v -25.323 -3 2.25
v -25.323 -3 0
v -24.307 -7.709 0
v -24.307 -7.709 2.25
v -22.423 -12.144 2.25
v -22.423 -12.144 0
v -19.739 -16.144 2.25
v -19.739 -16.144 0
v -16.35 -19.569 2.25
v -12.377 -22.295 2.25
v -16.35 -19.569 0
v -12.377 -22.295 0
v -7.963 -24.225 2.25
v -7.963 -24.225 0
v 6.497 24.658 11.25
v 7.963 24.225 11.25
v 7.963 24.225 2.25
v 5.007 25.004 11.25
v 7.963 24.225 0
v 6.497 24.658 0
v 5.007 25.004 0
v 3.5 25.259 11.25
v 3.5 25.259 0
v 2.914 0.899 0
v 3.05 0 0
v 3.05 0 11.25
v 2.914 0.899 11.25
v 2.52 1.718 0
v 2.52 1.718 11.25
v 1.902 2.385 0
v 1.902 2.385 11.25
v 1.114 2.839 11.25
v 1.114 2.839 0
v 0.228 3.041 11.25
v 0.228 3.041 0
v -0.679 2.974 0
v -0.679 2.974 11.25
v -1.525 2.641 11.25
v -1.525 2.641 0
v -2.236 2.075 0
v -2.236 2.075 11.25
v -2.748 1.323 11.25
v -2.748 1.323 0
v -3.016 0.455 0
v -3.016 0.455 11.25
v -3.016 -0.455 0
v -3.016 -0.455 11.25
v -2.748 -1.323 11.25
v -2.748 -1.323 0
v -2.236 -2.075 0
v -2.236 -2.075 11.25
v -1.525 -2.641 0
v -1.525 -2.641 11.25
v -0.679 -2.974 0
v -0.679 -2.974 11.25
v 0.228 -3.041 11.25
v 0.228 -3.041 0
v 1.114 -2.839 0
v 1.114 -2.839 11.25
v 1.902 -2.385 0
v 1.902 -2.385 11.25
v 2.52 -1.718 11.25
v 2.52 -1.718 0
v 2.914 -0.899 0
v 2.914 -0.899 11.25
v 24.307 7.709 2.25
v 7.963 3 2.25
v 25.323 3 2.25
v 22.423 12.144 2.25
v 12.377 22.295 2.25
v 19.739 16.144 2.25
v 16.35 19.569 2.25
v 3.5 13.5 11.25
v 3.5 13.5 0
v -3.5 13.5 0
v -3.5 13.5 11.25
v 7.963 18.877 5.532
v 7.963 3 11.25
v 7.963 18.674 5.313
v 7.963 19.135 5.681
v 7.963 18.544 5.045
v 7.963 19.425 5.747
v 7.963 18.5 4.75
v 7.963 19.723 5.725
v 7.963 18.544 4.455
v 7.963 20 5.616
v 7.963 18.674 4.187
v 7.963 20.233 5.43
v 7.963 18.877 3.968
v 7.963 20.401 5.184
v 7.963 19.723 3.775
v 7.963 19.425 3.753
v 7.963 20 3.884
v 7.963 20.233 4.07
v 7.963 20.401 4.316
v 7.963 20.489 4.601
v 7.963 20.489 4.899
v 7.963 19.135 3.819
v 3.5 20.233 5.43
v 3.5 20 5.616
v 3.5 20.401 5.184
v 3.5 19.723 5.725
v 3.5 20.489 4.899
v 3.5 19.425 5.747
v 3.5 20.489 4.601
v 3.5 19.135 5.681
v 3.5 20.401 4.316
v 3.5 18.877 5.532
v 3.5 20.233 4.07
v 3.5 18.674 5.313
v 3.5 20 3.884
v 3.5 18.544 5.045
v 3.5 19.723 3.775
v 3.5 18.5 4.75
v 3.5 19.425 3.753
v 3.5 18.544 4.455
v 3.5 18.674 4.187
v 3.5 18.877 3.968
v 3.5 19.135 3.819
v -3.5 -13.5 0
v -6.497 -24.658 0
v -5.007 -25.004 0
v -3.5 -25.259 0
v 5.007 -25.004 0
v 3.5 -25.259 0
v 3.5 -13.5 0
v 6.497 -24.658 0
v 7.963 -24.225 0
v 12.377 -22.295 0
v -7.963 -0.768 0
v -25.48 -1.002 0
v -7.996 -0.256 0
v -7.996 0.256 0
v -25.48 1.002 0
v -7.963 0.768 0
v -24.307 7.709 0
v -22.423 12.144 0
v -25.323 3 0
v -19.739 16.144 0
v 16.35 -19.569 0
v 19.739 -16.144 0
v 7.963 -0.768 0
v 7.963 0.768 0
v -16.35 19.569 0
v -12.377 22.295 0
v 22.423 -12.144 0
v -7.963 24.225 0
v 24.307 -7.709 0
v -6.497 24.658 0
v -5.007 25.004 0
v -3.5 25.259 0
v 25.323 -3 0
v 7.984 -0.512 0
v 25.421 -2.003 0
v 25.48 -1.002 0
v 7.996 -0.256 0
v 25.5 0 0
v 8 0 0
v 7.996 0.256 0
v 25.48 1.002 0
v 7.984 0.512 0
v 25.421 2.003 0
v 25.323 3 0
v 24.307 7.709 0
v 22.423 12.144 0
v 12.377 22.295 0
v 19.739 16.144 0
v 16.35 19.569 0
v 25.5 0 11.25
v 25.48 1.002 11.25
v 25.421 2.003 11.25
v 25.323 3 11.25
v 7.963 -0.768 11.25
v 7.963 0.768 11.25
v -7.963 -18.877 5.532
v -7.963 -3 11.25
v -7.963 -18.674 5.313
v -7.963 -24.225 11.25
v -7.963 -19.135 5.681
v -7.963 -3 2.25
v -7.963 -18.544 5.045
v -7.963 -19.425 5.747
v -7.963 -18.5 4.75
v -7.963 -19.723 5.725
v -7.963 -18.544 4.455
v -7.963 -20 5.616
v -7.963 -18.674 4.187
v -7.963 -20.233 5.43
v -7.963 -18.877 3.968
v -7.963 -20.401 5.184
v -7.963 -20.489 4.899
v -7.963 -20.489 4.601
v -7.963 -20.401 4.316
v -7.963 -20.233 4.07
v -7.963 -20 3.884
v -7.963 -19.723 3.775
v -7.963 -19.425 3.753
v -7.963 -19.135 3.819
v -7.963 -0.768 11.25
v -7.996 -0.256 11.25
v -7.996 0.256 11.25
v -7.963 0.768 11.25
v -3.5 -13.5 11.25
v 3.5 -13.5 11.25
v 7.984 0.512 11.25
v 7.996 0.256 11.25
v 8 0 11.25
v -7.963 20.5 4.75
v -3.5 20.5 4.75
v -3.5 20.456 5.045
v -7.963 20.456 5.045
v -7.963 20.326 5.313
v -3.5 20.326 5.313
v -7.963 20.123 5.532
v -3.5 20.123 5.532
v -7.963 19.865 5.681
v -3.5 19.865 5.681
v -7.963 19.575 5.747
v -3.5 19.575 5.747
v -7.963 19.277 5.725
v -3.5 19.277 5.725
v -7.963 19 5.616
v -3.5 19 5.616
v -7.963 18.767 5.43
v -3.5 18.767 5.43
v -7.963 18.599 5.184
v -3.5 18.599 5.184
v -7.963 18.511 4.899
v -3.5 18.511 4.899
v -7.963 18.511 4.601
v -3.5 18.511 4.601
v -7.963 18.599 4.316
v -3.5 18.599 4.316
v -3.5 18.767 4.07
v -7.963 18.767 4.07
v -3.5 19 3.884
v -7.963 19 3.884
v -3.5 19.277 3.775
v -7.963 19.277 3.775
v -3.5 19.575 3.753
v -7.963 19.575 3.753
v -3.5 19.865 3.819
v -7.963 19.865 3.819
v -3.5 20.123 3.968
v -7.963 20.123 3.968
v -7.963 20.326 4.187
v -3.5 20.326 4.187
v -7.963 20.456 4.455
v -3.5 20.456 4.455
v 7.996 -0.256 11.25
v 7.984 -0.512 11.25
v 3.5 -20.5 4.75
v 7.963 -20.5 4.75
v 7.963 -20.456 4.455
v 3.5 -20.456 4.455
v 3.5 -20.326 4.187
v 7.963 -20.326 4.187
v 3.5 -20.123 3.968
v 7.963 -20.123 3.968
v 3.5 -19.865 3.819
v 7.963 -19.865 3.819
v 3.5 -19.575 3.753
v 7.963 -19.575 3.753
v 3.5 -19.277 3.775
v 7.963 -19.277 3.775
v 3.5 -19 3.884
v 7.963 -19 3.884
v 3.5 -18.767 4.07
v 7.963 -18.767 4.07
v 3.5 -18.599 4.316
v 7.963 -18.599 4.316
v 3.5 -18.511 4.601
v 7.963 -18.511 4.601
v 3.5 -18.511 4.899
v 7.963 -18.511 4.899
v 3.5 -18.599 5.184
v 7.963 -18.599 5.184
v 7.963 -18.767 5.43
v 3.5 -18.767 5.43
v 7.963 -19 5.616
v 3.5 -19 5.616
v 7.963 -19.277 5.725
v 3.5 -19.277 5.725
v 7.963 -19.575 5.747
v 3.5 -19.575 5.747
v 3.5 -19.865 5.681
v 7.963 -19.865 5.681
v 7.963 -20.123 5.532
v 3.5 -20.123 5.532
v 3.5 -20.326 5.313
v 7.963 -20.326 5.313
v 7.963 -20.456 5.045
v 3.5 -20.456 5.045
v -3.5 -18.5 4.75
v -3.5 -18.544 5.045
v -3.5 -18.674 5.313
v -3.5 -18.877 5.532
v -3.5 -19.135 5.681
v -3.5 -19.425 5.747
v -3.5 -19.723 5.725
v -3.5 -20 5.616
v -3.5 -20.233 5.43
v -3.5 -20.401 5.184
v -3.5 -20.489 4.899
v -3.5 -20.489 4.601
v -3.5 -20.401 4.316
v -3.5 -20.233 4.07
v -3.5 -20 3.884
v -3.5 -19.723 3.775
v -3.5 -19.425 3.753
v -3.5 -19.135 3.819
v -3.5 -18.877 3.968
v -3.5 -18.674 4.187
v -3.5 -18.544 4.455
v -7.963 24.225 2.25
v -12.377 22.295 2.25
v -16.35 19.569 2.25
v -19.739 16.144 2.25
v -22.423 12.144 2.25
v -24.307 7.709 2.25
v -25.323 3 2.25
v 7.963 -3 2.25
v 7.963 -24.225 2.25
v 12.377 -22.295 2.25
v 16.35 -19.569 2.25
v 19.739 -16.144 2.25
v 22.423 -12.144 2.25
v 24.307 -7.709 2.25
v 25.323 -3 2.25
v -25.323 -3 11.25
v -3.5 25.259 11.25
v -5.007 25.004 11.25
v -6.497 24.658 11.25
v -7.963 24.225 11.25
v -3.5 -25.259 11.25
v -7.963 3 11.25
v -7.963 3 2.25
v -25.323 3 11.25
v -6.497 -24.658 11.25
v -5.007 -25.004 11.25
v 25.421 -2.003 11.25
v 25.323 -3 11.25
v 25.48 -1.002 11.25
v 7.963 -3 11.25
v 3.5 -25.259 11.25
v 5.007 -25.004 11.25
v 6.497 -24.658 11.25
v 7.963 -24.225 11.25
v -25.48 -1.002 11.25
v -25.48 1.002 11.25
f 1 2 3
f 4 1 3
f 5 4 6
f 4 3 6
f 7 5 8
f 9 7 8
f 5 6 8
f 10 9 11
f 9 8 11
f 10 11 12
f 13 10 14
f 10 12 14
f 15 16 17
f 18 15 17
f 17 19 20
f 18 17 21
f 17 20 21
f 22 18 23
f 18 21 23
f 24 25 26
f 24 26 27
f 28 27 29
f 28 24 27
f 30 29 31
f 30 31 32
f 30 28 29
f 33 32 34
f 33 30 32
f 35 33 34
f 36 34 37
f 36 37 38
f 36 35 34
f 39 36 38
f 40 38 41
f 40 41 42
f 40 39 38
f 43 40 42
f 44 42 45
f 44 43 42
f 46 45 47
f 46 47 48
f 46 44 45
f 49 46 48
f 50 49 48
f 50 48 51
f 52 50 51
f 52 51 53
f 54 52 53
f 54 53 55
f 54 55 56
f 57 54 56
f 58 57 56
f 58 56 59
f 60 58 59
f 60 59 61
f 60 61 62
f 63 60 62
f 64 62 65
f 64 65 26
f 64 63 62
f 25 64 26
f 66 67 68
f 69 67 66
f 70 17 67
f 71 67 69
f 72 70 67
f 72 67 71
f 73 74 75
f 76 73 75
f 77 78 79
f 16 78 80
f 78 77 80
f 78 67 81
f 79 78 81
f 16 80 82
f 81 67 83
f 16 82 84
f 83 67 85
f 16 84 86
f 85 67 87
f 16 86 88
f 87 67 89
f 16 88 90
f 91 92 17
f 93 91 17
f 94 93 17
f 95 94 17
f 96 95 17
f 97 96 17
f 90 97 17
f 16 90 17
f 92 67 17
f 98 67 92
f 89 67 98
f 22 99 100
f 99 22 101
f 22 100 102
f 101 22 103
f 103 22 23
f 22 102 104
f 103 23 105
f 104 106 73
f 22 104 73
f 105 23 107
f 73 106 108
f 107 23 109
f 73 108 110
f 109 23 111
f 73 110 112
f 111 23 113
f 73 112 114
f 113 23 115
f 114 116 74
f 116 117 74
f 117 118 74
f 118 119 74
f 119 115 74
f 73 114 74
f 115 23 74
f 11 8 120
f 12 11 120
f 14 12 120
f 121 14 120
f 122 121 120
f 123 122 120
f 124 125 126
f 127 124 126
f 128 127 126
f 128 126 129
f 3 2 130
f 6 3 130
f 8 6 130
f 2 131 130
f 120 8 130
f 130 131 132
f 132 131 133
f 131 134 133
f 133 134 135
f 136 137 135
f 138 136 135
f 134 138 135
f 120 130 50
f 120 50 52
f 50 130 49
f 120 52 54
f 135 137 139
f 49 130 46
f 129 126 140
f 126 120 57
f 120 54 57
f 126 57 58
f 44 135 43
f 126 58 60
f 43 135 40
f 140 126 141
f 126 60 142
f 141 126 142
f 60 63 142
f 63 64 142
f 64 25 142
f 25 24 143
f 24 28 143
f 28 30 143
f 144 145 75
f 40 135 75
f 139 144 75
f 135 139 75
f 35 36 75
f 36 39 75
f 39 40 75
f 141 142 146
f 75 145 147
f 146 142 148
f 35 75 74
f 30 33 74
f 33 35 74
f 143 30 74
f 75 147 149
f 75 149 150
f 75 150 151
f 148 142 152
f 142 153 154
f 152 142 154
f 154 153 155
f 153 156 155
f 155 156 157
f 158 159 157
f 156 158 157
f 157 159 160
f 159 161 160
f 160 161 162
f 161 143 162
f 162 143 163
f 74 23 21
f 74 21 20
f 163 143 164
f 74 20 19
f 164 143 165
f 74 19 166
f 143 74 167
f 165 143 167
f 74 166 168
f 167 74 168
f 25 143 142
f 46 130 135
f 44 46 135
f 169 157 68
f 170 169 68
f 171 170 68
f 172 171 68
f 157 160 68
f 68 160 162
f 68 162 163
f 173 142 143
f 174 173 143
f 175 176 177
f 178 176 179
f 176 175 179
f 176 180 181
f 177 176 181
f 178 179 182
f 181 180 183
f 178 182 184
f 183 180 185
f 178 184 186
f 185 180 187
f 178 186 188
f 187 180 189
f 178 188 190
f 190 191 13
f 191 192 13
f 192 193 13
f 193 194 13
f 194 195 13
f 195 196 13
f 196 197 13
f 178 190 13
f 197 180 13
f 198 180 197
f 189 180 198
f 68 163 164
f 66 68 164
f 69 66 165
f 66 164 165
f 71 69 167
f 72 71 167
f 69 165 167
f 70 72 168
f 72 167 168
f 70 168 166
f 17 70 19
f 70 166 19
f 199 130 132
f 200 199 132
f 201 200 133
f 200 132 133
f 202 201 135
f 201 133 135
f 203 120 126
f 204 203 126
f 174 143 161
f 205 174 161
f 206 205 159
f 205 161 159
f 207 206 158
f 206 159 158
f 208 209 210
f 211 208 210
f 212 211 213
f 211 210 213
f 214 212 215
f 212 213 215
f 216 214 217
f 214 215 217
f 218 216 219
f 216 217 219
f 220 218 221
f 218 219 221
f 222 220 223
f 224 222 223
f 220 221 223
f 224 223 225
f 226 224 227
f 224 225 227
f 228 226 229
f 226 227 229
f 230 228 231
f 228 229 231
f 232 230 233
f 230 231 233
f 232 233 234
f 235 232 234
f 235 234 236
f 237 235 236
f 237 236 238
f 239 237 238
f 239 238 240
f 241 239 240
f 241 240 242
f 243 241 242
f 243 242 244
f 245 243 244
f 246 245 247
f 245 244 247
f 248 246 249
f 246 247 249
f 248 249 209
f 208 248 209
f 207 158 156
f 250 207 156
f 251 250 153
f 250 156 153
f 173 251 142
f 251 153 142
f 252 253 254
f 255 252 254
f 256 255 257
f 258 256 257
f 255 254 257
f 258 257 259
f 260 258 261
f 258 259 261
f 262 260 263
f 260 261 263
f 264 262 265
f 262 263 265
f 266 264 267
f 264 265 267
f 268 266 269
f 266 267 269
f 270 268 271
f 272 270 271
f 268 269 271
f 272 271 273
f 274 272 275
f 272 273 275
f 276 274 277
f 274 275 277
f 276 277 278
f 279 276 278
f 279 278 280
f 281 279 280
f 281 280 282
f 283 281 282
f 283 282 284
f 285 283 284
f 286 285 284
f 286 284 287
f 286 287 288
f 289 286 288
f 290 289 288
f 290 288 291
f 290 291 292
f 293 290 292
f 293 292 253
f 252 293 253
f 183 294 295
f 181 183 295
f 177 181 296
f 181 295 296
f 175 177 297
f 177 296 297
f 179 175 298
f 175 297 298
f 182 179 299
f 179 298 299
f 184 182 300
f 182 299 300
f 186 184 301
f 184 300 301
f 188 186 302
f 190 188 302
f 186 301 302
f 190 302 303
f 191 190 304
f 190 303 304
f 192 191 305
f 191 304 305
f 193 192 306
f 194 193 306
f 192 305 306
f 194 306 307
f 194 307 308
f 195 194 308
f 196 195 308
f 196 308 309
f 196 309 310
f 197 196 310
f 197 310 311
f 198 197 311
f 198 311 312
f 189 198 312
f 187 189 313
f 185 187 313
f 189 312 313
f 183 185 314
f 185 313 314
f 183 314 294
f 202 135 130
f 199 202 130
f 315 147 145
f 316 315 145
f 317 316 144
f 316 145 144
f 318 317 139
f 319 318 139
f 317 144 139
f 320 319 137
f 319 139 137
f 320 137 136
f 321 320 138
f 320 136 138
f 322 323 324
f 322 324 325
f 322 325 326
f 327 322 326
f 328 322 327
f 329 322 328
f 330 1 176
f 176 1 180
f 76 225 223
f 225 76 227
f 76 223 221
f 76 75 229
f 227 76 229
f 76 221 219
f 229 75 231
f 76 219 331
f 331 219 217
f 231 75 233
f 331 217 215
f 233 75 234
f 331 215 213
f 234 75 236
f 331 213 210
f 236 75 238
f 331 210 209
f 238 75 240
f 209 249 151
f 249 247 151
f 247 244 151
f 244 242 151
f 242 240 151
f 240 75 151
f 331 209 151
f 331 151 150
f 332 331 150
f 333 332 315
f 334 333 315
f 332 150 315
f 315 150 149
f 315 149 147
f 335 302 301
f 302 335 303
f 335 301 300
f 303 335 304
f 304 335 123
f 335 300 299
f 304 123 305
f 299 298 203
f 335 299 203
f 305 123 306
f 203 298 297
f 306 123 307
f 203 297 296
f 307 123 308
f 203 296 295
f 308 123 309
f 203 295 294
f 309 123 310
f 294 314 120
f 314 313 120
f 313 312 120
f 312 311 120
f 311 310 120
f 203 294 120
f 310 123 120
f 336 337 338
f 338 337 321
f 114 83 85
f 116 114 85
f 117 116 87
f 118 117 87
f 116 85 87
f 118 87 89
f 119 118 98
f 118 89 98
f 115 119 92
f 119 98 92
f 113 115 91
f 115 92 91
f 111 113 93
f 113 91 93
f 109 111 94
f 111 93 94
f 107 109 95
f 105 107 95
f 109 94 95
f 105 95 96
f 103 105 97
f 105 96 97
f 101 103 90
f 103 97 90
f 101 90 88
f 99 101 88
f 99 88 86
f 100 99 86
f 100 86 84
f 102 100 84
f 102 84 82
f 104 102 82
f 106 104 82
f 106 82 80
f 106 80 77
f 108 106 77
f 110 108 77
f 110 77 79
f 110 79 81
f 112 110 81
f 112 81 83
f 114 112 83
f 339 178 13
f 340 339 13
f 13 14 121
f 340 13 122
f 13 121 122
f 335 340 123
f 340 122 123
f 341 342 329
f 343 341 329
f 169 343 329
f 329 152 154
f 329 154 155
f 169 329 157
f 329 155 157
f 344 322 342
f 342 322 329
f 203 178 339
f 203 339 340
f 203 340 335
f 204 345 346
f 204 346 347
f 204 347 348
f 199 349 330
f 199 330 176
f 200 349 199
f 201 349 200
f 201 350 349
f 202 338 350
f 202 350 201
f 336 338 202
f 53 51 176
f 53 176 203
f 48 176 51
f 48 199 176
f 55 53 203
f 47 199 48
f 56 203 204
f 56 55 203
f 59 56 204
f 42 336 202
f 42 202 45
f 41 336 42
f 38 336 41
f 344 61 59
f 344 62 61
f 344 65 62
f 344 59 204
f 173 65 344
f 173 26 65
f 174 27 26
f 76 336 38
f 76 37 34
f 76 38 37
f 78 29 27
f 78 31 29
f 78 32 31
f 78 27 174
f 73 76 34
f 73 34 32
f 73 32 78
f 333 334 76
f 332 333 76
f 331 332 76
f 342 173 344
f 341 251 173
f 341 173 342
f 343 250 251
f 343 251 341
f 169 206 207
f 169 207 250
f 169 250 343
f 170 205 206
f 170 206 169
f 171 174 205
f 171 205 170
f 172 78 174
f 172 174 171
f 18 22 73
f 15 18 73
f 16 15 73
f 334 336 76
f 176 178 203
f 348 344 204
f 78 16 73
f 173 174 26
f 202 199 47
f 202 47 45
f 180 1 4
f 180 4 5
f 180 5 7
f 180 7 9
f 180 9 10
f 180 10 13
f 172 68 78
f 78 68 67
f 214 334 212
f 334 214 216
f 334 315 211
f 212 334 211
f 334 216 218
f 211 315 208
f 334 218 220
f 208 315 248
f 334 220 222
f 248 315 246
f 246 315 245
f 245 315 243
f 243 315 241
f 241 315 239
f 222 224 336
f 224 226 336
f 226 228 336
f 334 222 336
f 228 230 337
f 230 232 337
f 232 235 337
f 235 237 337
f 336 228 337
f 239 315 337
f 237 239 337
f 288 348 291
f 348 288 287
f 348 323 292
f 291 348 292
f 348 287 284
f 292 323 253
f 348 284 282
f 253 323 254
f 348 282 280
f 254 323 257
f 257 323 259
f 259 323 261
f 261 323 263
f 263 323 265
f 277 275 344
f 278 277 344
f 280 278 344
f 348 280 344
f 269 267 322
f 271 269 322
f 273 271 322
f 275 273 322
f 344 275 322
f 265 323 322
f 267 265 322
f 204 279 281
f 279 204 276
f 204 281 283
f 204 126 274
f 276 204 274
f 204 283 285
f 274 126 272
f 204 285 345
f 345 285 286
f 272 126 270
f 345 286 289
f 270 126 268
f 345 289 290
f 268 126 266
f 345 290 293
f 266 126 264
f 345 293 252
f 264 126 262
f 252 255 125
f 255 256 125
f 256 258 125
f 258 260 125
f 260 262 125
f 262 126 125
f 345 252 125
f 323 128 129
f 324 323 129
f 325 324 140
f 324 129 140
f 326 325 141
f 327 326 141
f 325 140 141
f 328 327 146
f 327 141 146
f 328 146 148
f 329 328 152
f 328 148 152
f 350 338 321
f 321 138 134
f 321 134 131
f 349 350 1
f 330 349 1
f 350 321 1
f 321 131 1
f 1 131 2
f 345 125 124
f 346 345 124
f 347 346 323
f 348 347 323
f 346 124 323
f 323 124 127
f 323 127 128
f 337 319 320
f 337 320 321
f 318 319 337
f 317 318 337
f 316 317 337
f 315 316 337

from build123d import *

# Parameters (mm, degrees)
F0_R     = 3.05
F1_DEPTH = 11.25
F2_DEPTH = 2.25
F4_D     = 2
F4_DEPTH = 25.501
F5_D     = 2


with BuildPart() as f1:
    # F0 (on Top) → F1 (new body)
    with BuildSketch(Plane.XY):
        with BuildLine():
            Line((7.9630808905, -0.7676866104), (7.9630808905, 0.7676866104))
            ThreePointArc((7.9630808905, 0.7676866104), (6.5707016234, 4.5635381204), (3.5, 7.193747285))
            Line((3.5, 7.193747285), (3.5, -7.193747285))
            ThreePointArc((3.5, -7.193747285), (6.5707016234, -4.5635381204), (7.9630808905, -0.7676866104))
        make_face()
        with BuildLine():
            Line((3.5, -7.193747285), (3.5, 7.193747285))
            ThreePointArc((3.5, 7.193747285), (0, 8), (-3.5, 7.193747285))
            Line((-3.5, 7.193747285), (-3.5, -7.193747285))
            ThreePointArc((-3.5, -7.193747285), (0, -8), (3.5, -7.193747285))
        make_face()
        Circle(F0_R, mode=Mode.SUBTRACT)
        with BuildLine():
            Line((-3.5, -7.193747285), (-3.5, 7.193747285))
            ThreePointArc((-3.5, 7.193747285), (-6.5707016234, 4.5635381204), (-7.9630808905, 0.7676866104))
            Line((-7.9630808905, 0.7676866104), (-7.9630808905, -0.7676866104))
            ThreePointArc((-7.9630808905, -0.7676866104), (-6.5707016234, -4.5635381204), (-3.5, -7.193747285))
        make_face()
        with BuildLine():
            Line((-3.5, 13.5), (-3.5, 25.2586618806))
            ThreePointArc((-3.5, 25.2586618806), (-5.7548058579, 24.842145832), (-7.9630808905, 24.2247671347))
            Line((-7.9630808905, 24.2247671347), (-7.9630808905, 13.5))
            Line((-7.9630808905, 13.5), (-3.5, 13.5))
        make_face()
        with BuildLine():
            Line((7.9630808905, 13.5), (7.9630808905, 24.2247671347))
            ThreePointArc((7.9630808905, 24.2247671347), (5.7548058579, 24.842145832), (3.5, 25.2586618806))
            Line((3.5, 25.2586618806), (3.5, 13.5))
            Line((3.5, 13.5), (7.9630808905, 13.5))
        make_face()
        with BuildLine():
            ThreePointArc((3.5, -25.2586618806), (5.7548058579, -24.842145832), (7.9630808905, -24.2247671347))
            Line((7.9630808905, -24.2247671347), (7.9630808905, -13.5))
            Line((7.9630808905, -13.5), (3.5, -13.5))
            Line((3.5, -13.5), (3.5, -25.2586618806))
        make_face()
        with BuildLine():
            ThreePointArc((-7.9630808905, -24.2247671347), (-5.7548058579, -24.842145832), (-3.5, -25.2586618806))
            Line((-3.5, -25.2586618806), (-3.5, -13.5))
            Line((-3.5, -13.5), (-7.9630808905, -13.5))
            Line((-7.9630808905, -13.5), (-7.9630808905, -24.2247671347))
        make_face()
        with BuildLine():
            Line((-3.5, 7.193747285), (-3.5, 13.5))
            Line((-3.5, 13.5), (-7.9630808905, 13.5))
            Line((-7.9630808905, 13.5), (-7.9630808905, 3))
            Line((-7.9630808905, 3), (-7.9630808905, 0.7676866104))
            ThreePointArc((-7.9630808905, 0.7676866104), (-6.5707016234, 4.5635381204), (-3.5, 7.193747285))
        make_face()
        with BuildLine():
            Line((7.9630808905, 0.7676866104), (7.9630808905, 3))
            Line((7.9630808905, 3), (7.9630808905, 13.5))
            Line((7.9630808905, 13.5), (3.5, 13.5))
            Line((3.5, 13.5), (3.5, 7.193747285))
            ThreePointArc((3.5, 7.193747285), (6.5707016234, 4.5635381204), (7.9630808905, 0.7676866104))
        make_face()
        with BuildLine():
            Line((7.9630808905, -13.5), (7.9630808905, -3))
            Line((7.9630808905, -3), (7.9630808905, -0.7676866104))
            ThreePointArc((7.9630808905, -0.7676866104), (6.5707016234, -4.5635381204), (3.5, -7.193747285))
            Line((3.5, -7.193747285), (3.5, -13.5))
            Line((3.5, -13.5), (7.9630808905, -13.5))
        make_face()
        with BuildLine():
            Line((-7.9630808905, -13.5), (-3.5, -13.5))
            Line((-3.5, -13.5), (-3.5, -7.193747285))
            ThreePointArc((-3.5, -7.193747285), (-6.5707016234, -4.5635381204), (-7.9630808905, -0.7676866104))
            Line((-7.9630808905, -0.7676866104), (-7.9630808905, -3))
            Line((-7.9630808905, -3), (-7.9630808905, -13.5))
        make_face()
        with BuildLine():
            Line((-7.9630808905, 3), (-25.3229145242, 3))
            ThreePointArc((-25.3229145242, 3), (-25.5, 0), (-25.3229145242, -3))
            Line((-25.3229145242, -3), (-7.9630808905, -3))
            Line((-7.9630808905, -3), (-7.9630808905, -0.7676866104))
            ThreePointArc((-7.9630808905, -0.7676866104), (-8, 0), (-7.9630808905, 0.7676866104))
            Line((-7.9630808905, 0.7676866104), (-7.9630808905, 3))
        make_face()
        with BuildLine():
            ThreePointArc((25.3229145242, -3), (25.4556901337, -1.5026109997), (25.5, 0))
            ThreePointArc((25.5, 0), (25.4556901337, 1.5026109997), (25.3229145242, 3))
            Line((25.3229145242, 3), (7.9630808905, 3))
            Line((7.9630808905, 3), (7.9630808905, 0.7676866104))
            ThreePointArc((7.9630808905, 0.7676866104), (7.9907648922, 0.3842869216), (8, 0))
            ThreePointArc((8, 0), (7.9907648922, -0.3842869216), (7.9630808905, -0.7676866104))
            Line((7.9630808905, -0.7676866104), (7.9630808905, -3))
            Line((7.9630808905, -3), (25.3229145242, -3))
        make_face()
        with BuildLine():
            Line((-3.5, -13.5), (3.5, -13.5))
            Line((3.5, -13.5), (3.5, -7.193747285))
            ThreePointArc((3.5, -7.193747285), (0, -8), (-3.5, -7.193747285))
            Line((-3.5, -7.193747285), (-3.5, -13.5))
        make_face()
        with BuildLine():
            Line((3.5, 7.193747285), (3.5, 13.5))
            Line((3.5, 13.5), (-3.5, 13.5))
            Line((-3.5, 13.5), (-3.5, 7.193747285))
            ThreePointArc((-3.5, 7.193747285), (0, 8), (3.5, 7.193747285))
        make_face()
    extrude(amount=F1_DEPTH)

    # F0 (on Top) → F2 (join)
    with BuildSketch(Plane.XY):
        with BuildLine():
            ThreePointArc((-25.3229145242, -3), (-19.7385931025, -16.1442851292), (-7.9630808905, -24.2247671347))
            Line((-7.9630808905, -24.2247671347), (-7.9630808905, -13.5))
            Line((-7.9630808905, -13.5), (-7.9630808905, -3))
            Line((-7.9630808905, -3), (-25.3229145242, -3))
        make_face()
        with BuildLine():
            Line((-3.5, -13.5), (3.5, -13.5))
            Line((3.5, -13.5), (3.5, -7.193747285))
            ThreePointArc((3.5, -7.193747285), (0, -8), (-3.5, -7.193747285))
            Line((-3.5, -7.193747285), (-3.5, -13.5))
        make_face()
        with BuildLine():
            Line((3.5, 7.193747285), (3.5, 13.5))
            Line((3.5, 13.5), (-3.5, 13.5))
            Line((-3.5, 13.5), (-3.5, 7.193747285))
            ThreePointArc((-3.5, 7.193747285), (0, 8), (3.5, 7.193747285))
        make_face()
        with BuildLine():
            ThreePointArc((7.9630808905, -24.2247671347), (19.7385931025, -16.1442851292), (25.3229145242, -3))
            Line((25.3229145242, -3), (7.9630808905, -3))
            Line((7.9630808905, -3), (7.9630808905, -13.5))
            Line((7.9630808905, -13.5), (7.9630808905, -24.2247671347))
        make_face()
        with BuildLine():
            Line((7.9630808905, 3), (25.3229145242, 3))
            ThreePointArc((25.3229145242, 3), (19.7385931025, 16.1442851292), (7.9630808905, 24.2247671347))
            Line((7.9630808905, 24.2247671347), (7.9630808905, 13.5))
            Line((7.9630808905, 13.5), (7.9630808905, 3))
        make_face()
        with BuildLine():
            Line((-7.9630808905, 13.5), (-7.9630808905, 24.2247671347))
            ThreePointArc((-7.9630808905, 24.2247671347), (-19.7385931025, 16.1442851292), (-25.3229145242, 3))
            Line((-25.3229145242, 3), (-7.9630808905, 3))
            Line((-7.9630808905, 3), (-7.9630808905, 13.5))
        make_face()
    extrude(amount=F2_DEPTH)

    # F4 (through all, one way)
    with BuildSketch(Plane.YZ):
        with Locations((-19.5, 4.75), (19.5, 4.75)):
            Circle(F4_D / 2)
    extrude(amount=-F4_DEPTH, mode=Mode.SUBTRACT)

    # F5 (through all)
    with Locations(Plane(origin=(0, 0, 0), x_dir=(0, 1, 0), z_dir=(-1, 0, 0))):
        with Locations((-19.5, -4.75), (19.5, -4.75)):
            Hole(F5_D / 2)


solid = f1.part
